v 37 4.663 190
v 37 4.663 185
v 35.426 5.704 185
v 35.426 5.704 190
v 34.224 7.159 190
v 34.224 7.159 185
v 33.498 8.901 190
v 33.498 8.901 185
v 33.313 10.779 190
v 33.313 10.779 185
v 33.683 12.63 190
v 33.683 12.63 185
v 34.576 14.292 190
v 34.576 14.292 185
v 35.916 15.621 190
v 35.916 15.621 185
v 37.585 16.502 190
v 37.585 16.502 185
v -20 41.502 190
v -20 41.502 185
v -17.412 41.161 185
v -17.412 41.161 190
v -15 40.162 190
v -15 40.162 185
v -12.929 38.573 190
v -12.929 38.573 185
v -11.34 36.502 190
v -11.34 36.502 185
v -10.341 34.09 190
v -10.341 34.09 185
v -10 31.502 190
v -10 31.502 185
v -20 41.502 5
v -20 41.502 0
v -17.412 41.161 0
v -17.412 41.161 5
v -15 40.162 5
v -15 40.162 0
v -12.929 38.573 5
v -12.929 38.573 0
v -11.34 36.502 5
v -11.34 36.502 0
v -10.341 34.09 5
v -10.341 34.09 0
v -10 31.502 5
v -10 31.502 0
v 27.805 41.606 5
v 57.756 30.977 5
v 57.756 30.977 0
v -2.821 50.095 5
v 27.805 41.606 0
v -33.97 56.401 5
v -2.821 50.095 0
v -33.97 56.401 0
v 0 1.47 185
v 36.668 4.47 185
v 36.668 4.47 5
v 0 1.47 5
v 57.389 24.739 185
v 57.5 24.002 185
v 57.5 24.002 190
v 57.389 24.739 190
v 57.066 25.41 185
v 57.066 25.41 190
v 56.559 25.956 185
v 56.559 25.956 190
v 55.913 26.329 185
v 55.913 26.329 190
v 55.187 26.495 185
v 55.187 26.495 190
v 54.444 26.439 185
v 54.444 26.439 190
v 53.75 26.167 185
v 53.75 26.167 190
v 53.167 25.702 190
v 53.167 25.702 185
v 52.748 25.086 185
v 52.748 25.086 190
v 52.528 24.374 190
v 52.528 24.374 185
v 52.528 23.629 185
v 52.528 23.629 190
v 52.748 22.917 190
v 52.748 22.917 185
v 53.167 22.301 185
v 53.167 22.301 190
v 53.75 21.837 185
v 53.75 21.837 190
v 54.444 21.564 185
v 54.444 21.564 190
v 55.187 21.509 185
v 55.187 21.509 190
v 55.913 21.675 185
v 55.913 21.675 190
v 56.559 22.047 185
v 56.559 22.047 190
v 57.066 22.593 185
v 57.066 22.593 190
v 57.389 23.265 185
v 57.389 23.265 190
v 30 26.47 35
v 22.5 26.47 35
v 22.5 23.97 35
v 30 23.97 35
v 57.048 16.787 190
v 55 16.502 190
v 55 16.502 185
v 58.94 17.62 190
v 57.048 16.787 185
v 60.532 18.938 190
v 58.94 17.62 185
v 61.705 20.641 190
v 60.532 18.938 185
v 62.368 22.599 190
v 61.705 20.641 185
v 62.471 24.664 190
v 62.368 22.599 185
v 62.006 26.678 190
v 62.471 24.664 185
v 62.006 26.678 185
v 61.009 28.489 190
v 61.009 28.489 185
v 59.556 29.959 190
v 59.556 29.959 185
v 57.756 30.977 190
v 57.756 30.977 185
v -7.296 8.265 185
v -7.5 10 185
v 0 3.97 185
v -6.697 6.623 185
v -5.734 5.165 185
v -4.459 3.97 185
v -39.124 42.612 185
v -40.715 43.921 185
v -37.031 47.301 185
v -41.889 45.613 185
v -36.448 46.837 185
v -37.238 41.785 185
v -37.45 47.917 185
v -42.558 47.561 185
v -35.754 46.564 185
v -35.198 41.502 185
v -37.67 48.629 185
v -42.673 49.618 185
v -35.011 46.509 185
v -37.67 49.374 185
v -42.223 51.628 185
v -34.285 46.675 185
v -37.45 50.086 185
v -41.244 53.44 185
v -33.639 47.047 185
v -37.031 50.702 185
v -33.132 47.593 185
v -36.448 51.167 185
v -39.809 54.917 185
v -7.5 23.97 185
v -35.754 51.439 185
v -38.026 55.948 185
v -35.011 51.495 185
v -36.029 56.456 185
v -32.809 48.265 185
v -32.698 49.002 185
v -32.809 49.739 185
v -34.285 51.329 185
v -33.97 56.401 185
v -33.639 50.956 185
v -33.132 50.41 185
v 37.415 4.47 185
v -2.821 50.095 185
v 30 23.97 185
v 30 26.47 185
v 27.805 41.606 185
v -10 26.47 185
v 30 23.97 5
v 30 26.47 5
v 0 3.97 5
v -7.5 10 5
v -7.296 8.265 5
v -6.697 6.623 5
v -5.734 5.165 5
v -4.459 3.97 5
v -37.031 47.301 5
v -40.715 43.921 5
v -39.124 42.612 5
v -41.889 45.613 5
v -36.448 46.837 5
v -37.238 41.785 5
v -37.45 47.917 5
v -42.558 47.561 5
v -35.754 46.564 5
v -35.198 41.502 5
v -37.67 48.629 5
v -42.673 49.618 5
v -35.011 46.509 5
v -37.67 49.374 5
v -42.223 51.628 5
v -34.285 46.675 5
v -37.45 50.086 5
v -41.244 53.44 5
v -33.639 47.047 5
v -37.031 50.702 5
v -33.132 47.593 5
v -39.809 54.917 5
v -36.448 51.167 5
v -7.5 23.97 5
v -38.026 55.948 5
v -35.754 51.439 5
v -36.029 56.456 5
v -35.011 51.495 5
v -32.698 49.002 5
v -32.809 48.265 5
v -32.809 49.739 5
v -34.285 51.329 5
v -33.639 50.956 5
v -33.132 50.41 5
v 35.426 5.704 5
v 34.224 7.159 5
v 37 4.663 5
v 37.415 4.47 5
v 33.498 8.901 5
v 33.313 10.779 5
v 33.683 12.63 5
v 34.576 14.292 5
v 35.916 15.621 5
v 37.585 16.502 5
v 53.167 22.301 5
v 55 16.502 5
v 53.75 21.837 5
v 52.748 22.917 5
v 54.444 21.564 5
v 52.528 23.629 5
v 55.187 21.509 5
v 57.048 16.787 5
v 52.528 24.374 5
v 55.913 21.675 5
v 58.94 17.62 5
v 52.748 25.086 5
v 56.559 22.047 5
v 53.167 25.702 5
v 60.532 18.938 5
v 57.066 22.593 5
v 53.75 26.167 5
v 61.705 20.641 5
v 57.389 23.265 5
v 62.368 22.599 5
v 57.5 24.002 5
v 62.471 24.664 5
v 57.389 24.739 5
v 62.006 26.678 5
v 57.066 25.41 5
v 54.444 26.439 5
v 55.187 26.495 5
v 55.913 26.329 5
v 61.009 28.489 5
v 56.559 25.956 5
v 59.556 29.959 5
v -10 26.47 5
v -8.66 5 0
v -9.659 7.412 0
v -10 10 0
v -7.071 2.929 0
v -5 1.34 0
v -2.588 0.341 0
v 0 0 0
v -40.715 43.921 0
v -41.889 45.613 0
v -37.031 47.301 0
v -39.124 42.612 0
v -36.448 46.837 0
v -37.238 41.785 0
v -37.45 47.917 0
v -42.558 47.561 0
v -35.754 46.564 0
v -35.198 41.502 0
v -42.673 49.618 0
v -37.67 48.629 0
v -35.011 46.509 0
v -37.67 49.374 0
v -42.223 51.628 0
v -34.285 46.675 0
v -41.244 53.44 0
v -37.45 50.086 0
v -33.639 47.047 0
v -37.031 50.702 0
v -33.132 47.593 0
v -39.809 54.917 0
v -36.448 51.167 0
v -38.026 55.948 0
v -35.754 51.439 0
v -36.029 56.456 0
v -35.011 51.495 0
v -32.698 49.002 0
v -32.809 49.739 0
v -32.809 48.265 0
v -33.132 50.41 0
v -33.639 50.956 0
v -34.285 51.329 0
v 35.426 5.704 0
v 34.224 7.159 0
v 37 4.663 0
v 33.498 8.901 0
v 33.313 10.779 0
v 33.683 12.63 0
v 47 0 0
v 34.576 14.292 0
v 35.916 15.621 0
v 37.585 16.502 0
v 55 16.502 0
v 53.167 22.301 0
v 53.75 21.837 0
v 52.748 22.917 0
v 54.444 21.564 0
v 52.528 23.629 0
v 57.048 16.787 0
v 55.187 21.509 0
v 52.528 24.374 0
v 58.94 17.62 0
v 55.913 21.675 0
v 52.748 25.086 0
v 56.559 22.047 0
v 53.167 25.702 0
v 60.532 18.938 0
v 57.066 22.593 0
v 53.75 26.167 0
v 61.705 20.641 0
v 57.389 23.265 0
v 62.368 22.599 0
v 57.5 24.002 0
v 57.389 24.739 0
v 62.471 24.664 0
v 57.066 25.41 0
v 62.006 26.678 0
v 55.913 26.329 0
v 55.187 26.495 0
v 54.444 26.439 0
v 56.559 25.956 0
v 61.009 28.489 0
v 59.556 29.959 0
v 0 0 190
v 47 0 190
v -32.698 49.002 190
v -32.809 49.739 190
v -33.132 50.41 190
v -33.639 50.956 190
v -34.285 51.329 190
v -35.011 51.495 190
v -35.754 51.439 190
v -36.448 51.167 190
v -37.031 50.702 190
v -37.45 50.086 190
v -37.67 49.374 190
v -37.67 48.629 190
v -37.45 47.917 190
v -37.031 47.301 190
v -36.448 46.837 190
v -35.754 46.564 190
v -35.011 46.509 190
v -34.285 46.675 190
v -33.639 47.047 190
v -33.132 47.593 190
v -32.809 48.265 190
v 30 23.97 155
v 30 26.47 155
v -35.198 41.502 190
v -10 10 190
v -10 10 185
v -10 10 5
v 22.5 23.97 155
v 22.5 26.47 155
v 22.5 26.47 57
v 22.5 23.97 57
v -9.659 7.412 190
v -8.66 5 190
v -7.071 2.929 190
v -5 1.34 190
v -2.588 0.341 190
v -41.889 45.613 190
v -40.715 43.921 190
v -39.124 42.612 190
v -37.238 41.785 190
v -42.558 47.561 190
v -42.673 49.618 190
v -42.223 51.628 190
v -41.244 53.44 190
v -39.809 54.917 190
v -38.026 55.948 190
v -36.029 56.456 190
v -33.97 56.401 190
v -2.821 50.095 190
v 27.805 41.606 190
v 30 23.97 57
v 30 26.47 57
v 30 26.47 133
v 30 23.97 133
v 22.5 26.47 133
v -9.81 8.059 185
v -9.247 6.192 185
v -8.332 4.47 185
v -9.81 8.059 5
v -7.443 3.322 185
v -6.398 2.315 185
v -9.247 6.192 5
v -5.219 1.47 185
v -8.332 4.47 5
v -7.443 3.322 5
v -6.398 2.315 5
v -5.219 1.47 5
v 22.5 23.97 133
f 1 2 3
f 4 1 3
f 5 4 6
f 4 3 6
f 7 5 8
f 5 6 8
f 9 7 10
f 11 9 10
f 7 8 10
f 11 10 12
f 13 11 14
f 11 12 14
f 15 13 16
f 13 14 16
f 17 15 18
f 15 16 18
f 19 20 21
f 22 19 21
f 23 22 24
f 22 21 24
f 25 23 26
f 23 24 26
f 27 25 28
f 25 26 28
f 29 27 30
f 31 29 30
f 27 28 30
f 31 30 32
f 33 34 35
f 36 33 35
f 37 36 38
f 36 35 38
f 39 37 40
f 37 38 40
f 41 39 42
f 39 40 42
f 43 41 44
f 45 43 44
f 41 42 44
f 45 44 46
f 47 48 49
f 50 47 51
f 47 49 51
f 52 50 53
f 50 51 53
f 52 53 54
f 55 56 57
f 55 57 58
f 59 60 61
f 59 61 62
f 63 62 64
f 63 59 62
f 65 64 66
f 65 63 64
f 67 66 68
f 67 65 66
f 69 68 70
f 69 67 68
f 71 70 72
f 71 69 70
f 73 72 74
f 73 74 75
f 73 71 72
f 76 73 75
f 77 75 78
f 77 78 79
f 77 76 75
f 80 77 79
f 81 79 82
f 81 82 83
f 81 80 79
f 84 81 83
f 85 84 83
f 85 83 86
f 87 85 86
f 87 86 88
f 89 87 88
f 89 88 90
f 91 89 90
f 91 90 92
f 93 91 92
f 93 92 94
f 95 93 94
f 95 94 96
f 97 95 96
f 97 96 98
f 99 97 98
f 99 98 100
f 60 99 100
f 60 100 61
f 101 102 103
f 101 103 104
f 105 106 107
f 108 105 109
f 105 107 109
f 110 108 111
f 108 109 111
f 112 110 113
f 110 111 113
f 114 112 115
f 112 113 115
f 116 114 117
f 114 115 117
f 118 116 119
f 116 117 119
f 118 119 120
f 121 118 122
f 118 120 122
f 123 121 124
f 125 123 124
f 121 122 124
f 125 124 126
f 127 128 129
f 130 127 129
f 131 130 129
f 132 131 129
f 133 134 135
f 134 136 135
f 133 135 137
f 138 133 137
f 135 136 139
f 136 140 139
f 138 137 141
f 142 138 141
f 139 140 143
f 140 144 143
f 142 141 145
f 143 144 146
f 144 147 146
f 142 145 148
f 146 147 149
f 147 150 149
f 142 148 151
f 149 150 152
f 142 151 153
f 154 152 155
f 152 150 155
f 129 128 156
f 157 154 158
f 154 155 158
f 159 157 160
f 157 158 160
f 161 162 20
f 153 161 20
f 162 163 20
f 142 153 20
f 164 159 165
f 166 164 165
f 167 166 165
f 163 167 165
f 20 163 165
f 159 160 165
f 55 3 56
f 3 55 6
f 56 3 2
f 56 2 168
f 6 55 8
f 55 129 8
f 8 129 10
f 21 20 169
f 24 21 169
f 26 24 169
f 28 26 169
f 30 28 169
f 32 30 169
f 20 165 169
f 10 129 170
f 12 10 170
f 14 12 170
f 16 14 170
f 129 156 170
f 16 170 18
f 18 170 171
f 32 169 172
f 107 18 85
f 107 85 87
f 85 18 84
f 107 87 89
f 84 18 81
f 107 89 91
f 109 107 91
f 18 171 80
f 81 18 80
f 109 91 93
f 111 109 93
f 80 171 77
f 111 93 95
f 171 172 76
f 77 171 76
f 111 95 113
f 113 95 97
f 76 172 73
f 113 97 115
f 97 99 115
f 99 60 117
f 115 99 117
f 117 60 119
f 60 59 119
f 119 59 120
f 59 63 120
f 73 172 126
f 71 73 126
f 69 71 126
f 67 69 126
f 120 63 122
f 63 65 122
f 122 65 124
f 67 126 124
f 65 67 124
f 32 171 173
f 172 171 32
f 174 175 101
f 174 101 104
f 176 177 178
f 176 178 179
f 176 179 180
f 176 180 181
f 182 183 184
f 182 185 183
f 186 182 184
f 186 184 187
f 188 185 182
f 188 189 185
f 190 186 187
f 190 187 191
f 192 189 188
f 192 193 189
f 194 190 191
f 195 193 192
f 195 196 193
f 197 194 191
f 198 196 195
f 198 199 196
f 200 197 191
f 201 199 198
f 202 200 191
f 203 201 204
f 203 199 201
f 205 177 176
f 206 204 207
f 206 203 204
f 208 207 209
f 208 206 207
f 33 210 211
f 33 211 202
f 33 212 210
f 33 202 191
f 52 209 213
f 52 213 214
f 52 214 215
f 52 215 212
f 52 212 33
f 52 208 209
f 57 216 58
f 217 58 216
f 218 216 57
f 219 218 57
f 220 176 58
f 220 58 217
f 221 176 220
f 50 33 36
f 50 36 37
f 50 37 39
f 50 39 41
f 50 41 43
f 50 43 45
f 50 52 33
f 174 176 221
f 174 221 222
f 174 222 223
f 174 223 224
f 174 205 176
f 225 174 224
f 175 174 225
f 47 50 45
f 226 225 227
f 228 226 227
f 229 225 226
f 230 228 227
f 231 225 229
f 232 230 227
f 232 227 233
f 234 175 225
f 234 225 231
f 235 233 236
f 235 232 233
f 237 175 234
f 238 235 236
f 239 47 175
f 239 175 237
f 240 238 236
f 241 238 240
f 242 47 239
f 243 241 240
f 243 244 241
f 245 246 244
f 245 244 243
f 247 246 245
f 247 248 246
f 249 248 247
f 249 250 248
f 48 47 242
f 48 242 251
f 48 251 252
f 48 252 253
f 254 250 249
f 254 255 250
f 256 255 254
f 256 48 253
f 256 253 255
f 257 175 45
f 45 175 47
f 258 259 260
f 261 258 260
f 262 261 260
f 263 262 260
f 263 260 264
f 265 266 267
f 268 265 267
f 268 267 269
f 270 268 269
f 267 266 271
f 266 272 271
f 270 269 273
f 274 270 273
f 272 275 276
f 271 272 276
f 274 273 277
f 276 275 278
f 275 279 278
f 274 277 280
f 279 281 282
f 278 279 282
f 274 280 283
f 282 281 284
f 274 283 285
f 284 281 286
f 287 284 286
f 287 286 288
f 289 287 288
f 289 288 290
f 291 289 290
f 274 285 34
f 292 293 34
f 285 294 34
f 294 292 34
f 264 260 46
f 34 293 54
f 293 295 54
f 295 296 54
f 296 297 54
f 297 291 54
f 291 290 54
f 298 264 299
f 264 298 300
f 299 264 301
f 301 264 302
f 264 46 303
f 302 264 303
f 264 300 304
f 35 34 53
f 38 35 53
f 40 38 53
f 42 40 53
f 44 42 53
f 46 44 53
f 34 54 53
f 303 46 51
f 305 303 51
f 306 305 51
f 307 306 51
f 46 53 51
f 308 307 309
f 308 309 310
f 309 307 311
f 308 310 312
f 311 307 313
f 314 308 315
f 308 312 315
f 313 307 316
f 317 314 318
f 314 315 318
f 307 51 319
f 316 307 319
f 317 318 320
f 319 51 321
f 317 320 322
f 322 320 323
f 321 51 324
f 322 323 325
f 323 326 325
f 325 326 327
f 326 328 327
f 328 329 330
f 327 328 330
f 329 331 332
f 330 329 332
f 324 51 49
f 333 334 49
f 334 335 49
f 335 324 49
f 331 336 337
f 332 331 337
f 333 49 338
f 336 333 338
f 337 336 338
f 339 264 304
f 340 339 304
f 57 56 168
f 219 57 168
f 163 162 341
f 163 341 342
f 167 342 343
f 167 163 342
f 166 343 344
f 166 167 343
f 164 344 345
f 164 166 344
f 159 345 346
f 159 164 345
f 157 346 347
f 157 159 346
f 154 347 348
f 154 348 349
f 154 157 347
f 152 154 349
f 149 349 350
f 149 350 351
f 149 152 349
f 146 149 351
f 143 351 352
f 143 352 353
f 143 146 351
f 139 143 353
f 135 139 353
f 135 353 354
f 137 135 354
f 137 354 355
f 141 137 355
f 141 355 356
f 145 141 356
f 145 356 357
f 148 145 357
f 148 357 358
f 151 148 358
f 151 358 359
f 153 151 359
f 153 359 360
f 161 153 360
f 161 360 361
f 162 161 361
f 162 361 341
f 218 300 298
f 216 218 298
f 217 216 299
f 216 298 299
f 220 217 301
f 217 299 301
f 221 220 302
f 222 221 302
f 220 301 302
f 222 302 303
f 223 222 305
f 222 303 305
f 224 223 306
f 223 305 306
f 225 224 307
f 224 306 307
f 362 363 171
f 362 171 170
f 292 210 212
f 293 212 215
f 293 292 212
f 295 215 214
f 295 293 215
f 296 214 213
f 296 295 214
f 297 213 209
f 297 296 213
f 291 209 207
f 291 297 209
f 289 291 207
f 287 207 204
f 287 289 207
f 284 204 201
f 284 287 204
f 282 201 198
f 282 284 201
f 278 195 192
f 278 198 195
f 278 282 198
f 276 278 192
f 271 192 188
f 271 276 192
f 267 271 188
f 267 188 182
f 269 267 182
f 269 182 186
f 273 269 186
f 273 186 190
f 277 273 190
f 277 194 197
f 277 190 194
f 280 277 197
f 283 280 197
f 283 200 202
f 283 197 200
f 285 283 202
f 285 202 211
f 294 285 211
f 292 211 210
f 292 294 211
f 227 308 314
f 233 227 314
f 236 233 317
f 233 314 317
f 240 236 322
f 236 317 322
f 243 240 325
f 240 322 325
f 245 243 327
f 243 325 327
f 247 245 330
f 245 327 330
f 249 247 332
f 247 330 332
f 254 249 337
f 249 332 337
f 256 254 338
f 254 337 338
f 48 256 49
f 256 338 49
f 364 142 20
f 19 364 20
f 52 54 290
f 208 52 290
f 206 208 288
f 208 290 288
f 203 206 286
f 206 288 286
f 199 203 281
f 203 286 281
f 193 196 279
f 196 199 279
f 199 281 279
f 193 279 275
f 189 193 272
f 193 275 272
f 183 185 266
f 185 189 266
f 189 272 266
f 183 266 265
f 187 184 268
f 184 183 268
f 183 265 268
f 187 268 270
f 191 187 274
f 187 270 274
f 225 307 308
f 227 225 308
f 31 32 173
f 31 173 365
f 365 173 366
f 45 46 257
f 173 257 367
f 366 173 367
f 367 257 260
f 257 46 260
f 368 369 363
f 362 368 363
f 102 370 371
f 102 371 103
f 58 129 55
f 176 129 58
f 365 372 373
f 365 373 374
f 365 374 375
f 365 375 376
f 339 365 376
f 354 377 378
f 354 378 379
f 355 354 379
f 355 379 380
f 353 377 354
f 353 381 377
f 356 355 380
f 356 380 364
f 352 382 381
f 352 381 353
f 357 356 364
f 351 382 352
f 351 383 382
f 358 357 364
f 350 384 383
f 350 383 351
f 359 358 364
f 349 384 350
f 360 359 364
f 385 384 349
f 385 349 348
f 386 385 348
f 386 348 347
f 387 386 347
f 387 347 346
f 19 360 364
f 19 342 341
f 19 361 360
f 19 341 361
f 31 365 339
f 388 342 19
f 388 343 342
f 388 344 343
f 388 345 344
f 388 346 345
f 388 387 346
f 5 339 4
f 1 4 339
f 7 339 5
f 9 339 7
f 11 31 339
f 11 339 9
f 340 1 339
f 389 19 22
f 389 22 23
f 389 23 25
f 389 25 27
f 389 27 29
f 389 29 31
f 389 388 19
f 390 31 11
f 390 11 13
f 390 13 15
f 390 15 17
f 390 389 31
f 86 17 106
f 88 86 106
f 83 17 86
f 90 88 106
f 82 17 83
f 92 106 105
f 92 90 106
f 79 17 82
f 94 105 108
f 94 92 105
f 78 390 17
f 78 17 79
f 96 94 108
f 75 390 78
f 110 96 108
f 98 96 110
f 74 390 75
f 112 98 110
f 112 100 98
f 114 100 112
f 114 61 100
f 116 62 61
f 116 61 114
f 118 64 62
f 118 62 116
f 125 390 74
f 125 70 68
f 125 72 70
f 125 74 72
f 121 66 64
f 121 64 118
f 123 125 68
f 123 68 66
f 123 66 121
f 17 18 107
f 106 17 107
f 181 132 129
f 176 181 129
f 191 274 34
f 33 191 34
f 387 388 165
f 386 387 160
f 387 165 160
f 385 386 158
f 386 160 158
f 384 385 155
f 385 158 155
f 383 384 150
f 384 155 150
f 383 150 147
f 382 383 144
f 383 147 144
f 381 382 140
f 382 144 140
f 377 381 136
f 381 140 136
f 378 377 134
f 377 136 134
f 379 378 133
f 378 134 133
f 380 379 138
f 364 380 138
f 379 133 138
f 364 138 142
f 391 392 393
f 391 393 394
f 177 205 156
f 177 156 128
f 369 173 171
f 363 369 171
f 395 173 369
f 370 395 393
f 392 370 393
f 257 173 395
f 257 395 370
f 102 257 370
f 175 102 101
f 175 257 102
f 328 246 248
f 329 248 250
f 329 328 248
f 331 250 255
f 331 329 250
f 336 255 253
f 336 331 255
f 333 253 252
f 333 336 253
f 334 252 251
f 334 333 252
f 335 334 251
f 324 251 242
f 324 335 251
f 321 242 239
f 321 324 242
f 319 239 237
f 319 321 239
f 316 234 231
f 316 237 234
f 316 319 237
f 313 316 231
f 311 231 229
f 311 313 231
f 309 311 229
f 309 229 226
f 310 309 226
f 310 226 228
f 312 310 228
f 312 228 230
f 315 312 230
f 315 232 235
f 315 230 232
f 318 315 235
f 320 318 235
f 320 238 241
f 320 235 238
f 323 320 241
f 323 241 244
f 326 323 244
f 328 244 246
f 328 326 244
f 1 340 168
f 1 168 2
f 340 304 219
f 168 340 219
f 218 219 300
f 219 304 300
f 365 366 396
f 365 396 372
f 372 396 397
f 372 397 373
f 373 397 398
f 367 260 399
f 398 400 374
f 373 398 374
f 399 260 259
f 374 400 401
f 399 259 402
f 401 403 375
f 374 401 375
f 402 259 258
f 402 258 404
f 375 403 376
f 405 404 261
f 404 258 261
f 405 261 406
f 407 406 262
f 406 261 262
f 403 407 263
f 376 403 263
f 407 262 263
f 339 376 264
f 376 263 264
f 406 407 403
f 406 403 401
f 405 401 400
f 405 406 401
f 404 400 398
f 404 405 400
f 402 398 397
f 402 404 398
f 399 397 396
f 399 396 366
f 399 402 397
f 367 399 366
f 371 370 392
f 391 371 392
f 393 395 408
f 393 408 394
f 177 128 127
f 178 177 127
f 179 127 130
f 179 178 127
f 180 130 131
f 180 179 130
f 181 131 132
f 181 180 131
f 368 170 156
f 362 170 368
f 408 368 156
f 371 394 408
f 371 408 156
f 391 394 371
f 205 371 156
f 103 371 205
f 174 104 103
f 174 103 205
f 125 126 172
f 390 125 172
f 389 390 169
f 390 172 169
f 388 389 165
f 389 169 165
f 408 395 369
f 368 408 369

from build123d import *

# Parameters (mm, degrees)
SKETCH1_R           = 2.5
BOSS_EXTRUDE1_DEPTH = 190
SKETCH2_W           = 136.127535613
SKETCH2_H           = 180
CUT_EXTRUDE2_DEPTH  = 58
SKETCH3_W           = 45
SKETCH3_H           = 180
CUT_EXTRUDE3_DEPTH  = 3
BOSS_EXTRUDE2_START = 180
BOSS_EXTRUDE2_DEPTH = 180
SKETCH7_W           = 180
SKETCH7_H           = 22.5
CUT_EXTRUDE13_DEPTH = 30
SKETCH9_W           = 7.5
SKETCH9_H           = 22
CUT_EXTRUDE14_DEPTH = 3
BOSS_EXTRUDE3_DEPTH = 180


with BuildPart() as part:
    # Sketch1 → Boss-Extrude1 (new body)
    with BuildSketch(Plane.XY):
        with BuildLine():
            Line((0, 0), (47, 0))
            Line((47, 0), (37, 4.663076582))
            ThreePointArc((37, 4.663076582), (33.312668804, 10.778986497), (37.584760477, 16.501747909))
            Line((37.584760477, 16.501747909), (55, 16.501747909))
            ThreePointArc((55, 16.501747909), (62.367611495, 22.598786451), (57.756393324, 30.976867682))
            ThreePointArc((57.756393324, 30.976867682), (12.567155409, 46.120826206), (-33.970281413, 56.400596496))
            ThreePointArc((-33.970281413, 56.400596496), (-42.672566196, 49.617635726), (-35.197896825, 41.501747909))
            Line((-35.197896825, 41.501747909), (-20, 41.501747909))
            ThreePointArc((-20, 41.501747909), (-12.928932188, 38.572815721), (-10, 31.501747909))
            Line((-10, 31.501747909), (-10, 10))
            ThreePointArc((-10, 10), (-7.071067812, 2.928932188), (0, 0))
        make_face()
        with Locations((55, 24.001747909)):
            Circle(SKETCH1_R, mode=Mode.SUBTRACT)
        with Locations((-35.197896825, 49.001747909)):
            Circle(SKETCH1_R, mode=Mode.SUBTRACT)
    extrude(amount=BOSS_EXTRUDE1_DEPTH)

    # Sketch2 → Cut-Extrude2 (cut)
    with BuildSketch(Plane(origin=(0, 62.46968133, 0), x_dir=(1, 0, 0), z_dir=(0, 1, 0))):
        with Locations((11.703146866, -95)):
            Rectangle(SKETCH2_W, SKETCH2_H)
    extrude(amount=-CUT_EXTRUDE2_DEPTH, mode=Mode.SUBTRACT)

    # Sketch3 → Cut-Extrude3 (cut)
    with BuildSketch(Plane(origin=(0, 4.46968133, 0), x_dir=(1, 0, 0), z_dir=(0, 1, 0))):
        with Locations((14.168398989, -95)):
            Rectangle(SKETCH3_W, SKETCH3_H)
    extrude(amount=-CUT_EXTRUDE3_DEPTH, mode=Mode.SUBTRACT)



with BuildPart() as body_2:
    # Sketch4 → Boss-Extrude2 (new body)
    with BuildSketch(Plane(origin=(0, 0, 185), x_dir=(-1, 0, 0), z_dir=(0, 0, -1)).offset(BOSS_EXTRUDE2_START)):
        with BuildLine():
            Line((-30, 26.46968133), (-30, 1.46968133))
            Line((-30, 1.46968133), (5.218588256, 1.46968133))
            ThreePointArc((5.218588256, 1.46968133), (8.723126806, 5.110515495), (10, 10))
            Line((10, 10), (10, 26.46968133))
            Line((10, 26.46968133), (-30, 26.46968133))
        make_face()
        with BuildLine():
            Line((-27.5, 23.96968133), (7.5, 23.96968133))
            Line((7.5, 23.96968133), (7.5, 10))
            ThreePointArc((7.5, 10), (6.696815143, 6.62321648), (4.459288815, 3.96968133))
            Line((4.459288815, 3.96968133), (-27.5, 3.96968133))
            Line((-27.5, 3.96968133), (-27.5, 23.96968133))
        make_face(mode=Mode.SUBTRACT)
    extrude(amount=-BOSS_EXTRUDE2_DEPTH)

    # Sketch7 → Cut-Extrude13 (cut)
    with BuildSketch(Plane(origin=(30, 0, 0), x_dir=(0, 0, -1), z_dir=(1, 0, 0))):
        with Locations((-95, 12.71968133)):
            Rectangle(SKETCH7_W, SKETCH7_H)
    extrude(amount=-CUT_EXTRUDE13_DEPTH, mode=Mode.SUBTRACT)

    # Sketch9 → Cut-Extrude14 (cut)
    with BuildSketch(Plane(origin=(0, 26.46968133, 0), x_dir=(1, 0, 0), z_dir=(0, 1, 0))):
        with Locations((26.25, -46)):
            Rectangle(SKETCH9_W, SKETCH9_H)
    cut_extrude14 = extrude(amount=-CUT_EXTRUDE14_DEPTH, mode=Mode.SUBTRACT)

    # Mirror1: Cut-Extrude14 across plane
    add(cut_extrude14.mirror(Plane.XY.offset(95)), mode=Mode.SUBTRACT)


with BuildPart() as part_1:
    add(part.part)

    add(body_2.part)  # Boss-Extrude3 merges body 2
    # Sketch10 → Boss-Extrude3 (add)
    with BuildSketch(Plane(origin=(0, 0, 185), x_dir=(-1, 0, 0), z_dir=(0, 0, -1))):
        Polygon((-36.668398989, 1.46968133), (-36.668398989, 4.46968133), (0, 1.46968133), align=None)
    extrude(amount=BOSS_EXTRUDE3_DEPTH)


solid = part_1.part
